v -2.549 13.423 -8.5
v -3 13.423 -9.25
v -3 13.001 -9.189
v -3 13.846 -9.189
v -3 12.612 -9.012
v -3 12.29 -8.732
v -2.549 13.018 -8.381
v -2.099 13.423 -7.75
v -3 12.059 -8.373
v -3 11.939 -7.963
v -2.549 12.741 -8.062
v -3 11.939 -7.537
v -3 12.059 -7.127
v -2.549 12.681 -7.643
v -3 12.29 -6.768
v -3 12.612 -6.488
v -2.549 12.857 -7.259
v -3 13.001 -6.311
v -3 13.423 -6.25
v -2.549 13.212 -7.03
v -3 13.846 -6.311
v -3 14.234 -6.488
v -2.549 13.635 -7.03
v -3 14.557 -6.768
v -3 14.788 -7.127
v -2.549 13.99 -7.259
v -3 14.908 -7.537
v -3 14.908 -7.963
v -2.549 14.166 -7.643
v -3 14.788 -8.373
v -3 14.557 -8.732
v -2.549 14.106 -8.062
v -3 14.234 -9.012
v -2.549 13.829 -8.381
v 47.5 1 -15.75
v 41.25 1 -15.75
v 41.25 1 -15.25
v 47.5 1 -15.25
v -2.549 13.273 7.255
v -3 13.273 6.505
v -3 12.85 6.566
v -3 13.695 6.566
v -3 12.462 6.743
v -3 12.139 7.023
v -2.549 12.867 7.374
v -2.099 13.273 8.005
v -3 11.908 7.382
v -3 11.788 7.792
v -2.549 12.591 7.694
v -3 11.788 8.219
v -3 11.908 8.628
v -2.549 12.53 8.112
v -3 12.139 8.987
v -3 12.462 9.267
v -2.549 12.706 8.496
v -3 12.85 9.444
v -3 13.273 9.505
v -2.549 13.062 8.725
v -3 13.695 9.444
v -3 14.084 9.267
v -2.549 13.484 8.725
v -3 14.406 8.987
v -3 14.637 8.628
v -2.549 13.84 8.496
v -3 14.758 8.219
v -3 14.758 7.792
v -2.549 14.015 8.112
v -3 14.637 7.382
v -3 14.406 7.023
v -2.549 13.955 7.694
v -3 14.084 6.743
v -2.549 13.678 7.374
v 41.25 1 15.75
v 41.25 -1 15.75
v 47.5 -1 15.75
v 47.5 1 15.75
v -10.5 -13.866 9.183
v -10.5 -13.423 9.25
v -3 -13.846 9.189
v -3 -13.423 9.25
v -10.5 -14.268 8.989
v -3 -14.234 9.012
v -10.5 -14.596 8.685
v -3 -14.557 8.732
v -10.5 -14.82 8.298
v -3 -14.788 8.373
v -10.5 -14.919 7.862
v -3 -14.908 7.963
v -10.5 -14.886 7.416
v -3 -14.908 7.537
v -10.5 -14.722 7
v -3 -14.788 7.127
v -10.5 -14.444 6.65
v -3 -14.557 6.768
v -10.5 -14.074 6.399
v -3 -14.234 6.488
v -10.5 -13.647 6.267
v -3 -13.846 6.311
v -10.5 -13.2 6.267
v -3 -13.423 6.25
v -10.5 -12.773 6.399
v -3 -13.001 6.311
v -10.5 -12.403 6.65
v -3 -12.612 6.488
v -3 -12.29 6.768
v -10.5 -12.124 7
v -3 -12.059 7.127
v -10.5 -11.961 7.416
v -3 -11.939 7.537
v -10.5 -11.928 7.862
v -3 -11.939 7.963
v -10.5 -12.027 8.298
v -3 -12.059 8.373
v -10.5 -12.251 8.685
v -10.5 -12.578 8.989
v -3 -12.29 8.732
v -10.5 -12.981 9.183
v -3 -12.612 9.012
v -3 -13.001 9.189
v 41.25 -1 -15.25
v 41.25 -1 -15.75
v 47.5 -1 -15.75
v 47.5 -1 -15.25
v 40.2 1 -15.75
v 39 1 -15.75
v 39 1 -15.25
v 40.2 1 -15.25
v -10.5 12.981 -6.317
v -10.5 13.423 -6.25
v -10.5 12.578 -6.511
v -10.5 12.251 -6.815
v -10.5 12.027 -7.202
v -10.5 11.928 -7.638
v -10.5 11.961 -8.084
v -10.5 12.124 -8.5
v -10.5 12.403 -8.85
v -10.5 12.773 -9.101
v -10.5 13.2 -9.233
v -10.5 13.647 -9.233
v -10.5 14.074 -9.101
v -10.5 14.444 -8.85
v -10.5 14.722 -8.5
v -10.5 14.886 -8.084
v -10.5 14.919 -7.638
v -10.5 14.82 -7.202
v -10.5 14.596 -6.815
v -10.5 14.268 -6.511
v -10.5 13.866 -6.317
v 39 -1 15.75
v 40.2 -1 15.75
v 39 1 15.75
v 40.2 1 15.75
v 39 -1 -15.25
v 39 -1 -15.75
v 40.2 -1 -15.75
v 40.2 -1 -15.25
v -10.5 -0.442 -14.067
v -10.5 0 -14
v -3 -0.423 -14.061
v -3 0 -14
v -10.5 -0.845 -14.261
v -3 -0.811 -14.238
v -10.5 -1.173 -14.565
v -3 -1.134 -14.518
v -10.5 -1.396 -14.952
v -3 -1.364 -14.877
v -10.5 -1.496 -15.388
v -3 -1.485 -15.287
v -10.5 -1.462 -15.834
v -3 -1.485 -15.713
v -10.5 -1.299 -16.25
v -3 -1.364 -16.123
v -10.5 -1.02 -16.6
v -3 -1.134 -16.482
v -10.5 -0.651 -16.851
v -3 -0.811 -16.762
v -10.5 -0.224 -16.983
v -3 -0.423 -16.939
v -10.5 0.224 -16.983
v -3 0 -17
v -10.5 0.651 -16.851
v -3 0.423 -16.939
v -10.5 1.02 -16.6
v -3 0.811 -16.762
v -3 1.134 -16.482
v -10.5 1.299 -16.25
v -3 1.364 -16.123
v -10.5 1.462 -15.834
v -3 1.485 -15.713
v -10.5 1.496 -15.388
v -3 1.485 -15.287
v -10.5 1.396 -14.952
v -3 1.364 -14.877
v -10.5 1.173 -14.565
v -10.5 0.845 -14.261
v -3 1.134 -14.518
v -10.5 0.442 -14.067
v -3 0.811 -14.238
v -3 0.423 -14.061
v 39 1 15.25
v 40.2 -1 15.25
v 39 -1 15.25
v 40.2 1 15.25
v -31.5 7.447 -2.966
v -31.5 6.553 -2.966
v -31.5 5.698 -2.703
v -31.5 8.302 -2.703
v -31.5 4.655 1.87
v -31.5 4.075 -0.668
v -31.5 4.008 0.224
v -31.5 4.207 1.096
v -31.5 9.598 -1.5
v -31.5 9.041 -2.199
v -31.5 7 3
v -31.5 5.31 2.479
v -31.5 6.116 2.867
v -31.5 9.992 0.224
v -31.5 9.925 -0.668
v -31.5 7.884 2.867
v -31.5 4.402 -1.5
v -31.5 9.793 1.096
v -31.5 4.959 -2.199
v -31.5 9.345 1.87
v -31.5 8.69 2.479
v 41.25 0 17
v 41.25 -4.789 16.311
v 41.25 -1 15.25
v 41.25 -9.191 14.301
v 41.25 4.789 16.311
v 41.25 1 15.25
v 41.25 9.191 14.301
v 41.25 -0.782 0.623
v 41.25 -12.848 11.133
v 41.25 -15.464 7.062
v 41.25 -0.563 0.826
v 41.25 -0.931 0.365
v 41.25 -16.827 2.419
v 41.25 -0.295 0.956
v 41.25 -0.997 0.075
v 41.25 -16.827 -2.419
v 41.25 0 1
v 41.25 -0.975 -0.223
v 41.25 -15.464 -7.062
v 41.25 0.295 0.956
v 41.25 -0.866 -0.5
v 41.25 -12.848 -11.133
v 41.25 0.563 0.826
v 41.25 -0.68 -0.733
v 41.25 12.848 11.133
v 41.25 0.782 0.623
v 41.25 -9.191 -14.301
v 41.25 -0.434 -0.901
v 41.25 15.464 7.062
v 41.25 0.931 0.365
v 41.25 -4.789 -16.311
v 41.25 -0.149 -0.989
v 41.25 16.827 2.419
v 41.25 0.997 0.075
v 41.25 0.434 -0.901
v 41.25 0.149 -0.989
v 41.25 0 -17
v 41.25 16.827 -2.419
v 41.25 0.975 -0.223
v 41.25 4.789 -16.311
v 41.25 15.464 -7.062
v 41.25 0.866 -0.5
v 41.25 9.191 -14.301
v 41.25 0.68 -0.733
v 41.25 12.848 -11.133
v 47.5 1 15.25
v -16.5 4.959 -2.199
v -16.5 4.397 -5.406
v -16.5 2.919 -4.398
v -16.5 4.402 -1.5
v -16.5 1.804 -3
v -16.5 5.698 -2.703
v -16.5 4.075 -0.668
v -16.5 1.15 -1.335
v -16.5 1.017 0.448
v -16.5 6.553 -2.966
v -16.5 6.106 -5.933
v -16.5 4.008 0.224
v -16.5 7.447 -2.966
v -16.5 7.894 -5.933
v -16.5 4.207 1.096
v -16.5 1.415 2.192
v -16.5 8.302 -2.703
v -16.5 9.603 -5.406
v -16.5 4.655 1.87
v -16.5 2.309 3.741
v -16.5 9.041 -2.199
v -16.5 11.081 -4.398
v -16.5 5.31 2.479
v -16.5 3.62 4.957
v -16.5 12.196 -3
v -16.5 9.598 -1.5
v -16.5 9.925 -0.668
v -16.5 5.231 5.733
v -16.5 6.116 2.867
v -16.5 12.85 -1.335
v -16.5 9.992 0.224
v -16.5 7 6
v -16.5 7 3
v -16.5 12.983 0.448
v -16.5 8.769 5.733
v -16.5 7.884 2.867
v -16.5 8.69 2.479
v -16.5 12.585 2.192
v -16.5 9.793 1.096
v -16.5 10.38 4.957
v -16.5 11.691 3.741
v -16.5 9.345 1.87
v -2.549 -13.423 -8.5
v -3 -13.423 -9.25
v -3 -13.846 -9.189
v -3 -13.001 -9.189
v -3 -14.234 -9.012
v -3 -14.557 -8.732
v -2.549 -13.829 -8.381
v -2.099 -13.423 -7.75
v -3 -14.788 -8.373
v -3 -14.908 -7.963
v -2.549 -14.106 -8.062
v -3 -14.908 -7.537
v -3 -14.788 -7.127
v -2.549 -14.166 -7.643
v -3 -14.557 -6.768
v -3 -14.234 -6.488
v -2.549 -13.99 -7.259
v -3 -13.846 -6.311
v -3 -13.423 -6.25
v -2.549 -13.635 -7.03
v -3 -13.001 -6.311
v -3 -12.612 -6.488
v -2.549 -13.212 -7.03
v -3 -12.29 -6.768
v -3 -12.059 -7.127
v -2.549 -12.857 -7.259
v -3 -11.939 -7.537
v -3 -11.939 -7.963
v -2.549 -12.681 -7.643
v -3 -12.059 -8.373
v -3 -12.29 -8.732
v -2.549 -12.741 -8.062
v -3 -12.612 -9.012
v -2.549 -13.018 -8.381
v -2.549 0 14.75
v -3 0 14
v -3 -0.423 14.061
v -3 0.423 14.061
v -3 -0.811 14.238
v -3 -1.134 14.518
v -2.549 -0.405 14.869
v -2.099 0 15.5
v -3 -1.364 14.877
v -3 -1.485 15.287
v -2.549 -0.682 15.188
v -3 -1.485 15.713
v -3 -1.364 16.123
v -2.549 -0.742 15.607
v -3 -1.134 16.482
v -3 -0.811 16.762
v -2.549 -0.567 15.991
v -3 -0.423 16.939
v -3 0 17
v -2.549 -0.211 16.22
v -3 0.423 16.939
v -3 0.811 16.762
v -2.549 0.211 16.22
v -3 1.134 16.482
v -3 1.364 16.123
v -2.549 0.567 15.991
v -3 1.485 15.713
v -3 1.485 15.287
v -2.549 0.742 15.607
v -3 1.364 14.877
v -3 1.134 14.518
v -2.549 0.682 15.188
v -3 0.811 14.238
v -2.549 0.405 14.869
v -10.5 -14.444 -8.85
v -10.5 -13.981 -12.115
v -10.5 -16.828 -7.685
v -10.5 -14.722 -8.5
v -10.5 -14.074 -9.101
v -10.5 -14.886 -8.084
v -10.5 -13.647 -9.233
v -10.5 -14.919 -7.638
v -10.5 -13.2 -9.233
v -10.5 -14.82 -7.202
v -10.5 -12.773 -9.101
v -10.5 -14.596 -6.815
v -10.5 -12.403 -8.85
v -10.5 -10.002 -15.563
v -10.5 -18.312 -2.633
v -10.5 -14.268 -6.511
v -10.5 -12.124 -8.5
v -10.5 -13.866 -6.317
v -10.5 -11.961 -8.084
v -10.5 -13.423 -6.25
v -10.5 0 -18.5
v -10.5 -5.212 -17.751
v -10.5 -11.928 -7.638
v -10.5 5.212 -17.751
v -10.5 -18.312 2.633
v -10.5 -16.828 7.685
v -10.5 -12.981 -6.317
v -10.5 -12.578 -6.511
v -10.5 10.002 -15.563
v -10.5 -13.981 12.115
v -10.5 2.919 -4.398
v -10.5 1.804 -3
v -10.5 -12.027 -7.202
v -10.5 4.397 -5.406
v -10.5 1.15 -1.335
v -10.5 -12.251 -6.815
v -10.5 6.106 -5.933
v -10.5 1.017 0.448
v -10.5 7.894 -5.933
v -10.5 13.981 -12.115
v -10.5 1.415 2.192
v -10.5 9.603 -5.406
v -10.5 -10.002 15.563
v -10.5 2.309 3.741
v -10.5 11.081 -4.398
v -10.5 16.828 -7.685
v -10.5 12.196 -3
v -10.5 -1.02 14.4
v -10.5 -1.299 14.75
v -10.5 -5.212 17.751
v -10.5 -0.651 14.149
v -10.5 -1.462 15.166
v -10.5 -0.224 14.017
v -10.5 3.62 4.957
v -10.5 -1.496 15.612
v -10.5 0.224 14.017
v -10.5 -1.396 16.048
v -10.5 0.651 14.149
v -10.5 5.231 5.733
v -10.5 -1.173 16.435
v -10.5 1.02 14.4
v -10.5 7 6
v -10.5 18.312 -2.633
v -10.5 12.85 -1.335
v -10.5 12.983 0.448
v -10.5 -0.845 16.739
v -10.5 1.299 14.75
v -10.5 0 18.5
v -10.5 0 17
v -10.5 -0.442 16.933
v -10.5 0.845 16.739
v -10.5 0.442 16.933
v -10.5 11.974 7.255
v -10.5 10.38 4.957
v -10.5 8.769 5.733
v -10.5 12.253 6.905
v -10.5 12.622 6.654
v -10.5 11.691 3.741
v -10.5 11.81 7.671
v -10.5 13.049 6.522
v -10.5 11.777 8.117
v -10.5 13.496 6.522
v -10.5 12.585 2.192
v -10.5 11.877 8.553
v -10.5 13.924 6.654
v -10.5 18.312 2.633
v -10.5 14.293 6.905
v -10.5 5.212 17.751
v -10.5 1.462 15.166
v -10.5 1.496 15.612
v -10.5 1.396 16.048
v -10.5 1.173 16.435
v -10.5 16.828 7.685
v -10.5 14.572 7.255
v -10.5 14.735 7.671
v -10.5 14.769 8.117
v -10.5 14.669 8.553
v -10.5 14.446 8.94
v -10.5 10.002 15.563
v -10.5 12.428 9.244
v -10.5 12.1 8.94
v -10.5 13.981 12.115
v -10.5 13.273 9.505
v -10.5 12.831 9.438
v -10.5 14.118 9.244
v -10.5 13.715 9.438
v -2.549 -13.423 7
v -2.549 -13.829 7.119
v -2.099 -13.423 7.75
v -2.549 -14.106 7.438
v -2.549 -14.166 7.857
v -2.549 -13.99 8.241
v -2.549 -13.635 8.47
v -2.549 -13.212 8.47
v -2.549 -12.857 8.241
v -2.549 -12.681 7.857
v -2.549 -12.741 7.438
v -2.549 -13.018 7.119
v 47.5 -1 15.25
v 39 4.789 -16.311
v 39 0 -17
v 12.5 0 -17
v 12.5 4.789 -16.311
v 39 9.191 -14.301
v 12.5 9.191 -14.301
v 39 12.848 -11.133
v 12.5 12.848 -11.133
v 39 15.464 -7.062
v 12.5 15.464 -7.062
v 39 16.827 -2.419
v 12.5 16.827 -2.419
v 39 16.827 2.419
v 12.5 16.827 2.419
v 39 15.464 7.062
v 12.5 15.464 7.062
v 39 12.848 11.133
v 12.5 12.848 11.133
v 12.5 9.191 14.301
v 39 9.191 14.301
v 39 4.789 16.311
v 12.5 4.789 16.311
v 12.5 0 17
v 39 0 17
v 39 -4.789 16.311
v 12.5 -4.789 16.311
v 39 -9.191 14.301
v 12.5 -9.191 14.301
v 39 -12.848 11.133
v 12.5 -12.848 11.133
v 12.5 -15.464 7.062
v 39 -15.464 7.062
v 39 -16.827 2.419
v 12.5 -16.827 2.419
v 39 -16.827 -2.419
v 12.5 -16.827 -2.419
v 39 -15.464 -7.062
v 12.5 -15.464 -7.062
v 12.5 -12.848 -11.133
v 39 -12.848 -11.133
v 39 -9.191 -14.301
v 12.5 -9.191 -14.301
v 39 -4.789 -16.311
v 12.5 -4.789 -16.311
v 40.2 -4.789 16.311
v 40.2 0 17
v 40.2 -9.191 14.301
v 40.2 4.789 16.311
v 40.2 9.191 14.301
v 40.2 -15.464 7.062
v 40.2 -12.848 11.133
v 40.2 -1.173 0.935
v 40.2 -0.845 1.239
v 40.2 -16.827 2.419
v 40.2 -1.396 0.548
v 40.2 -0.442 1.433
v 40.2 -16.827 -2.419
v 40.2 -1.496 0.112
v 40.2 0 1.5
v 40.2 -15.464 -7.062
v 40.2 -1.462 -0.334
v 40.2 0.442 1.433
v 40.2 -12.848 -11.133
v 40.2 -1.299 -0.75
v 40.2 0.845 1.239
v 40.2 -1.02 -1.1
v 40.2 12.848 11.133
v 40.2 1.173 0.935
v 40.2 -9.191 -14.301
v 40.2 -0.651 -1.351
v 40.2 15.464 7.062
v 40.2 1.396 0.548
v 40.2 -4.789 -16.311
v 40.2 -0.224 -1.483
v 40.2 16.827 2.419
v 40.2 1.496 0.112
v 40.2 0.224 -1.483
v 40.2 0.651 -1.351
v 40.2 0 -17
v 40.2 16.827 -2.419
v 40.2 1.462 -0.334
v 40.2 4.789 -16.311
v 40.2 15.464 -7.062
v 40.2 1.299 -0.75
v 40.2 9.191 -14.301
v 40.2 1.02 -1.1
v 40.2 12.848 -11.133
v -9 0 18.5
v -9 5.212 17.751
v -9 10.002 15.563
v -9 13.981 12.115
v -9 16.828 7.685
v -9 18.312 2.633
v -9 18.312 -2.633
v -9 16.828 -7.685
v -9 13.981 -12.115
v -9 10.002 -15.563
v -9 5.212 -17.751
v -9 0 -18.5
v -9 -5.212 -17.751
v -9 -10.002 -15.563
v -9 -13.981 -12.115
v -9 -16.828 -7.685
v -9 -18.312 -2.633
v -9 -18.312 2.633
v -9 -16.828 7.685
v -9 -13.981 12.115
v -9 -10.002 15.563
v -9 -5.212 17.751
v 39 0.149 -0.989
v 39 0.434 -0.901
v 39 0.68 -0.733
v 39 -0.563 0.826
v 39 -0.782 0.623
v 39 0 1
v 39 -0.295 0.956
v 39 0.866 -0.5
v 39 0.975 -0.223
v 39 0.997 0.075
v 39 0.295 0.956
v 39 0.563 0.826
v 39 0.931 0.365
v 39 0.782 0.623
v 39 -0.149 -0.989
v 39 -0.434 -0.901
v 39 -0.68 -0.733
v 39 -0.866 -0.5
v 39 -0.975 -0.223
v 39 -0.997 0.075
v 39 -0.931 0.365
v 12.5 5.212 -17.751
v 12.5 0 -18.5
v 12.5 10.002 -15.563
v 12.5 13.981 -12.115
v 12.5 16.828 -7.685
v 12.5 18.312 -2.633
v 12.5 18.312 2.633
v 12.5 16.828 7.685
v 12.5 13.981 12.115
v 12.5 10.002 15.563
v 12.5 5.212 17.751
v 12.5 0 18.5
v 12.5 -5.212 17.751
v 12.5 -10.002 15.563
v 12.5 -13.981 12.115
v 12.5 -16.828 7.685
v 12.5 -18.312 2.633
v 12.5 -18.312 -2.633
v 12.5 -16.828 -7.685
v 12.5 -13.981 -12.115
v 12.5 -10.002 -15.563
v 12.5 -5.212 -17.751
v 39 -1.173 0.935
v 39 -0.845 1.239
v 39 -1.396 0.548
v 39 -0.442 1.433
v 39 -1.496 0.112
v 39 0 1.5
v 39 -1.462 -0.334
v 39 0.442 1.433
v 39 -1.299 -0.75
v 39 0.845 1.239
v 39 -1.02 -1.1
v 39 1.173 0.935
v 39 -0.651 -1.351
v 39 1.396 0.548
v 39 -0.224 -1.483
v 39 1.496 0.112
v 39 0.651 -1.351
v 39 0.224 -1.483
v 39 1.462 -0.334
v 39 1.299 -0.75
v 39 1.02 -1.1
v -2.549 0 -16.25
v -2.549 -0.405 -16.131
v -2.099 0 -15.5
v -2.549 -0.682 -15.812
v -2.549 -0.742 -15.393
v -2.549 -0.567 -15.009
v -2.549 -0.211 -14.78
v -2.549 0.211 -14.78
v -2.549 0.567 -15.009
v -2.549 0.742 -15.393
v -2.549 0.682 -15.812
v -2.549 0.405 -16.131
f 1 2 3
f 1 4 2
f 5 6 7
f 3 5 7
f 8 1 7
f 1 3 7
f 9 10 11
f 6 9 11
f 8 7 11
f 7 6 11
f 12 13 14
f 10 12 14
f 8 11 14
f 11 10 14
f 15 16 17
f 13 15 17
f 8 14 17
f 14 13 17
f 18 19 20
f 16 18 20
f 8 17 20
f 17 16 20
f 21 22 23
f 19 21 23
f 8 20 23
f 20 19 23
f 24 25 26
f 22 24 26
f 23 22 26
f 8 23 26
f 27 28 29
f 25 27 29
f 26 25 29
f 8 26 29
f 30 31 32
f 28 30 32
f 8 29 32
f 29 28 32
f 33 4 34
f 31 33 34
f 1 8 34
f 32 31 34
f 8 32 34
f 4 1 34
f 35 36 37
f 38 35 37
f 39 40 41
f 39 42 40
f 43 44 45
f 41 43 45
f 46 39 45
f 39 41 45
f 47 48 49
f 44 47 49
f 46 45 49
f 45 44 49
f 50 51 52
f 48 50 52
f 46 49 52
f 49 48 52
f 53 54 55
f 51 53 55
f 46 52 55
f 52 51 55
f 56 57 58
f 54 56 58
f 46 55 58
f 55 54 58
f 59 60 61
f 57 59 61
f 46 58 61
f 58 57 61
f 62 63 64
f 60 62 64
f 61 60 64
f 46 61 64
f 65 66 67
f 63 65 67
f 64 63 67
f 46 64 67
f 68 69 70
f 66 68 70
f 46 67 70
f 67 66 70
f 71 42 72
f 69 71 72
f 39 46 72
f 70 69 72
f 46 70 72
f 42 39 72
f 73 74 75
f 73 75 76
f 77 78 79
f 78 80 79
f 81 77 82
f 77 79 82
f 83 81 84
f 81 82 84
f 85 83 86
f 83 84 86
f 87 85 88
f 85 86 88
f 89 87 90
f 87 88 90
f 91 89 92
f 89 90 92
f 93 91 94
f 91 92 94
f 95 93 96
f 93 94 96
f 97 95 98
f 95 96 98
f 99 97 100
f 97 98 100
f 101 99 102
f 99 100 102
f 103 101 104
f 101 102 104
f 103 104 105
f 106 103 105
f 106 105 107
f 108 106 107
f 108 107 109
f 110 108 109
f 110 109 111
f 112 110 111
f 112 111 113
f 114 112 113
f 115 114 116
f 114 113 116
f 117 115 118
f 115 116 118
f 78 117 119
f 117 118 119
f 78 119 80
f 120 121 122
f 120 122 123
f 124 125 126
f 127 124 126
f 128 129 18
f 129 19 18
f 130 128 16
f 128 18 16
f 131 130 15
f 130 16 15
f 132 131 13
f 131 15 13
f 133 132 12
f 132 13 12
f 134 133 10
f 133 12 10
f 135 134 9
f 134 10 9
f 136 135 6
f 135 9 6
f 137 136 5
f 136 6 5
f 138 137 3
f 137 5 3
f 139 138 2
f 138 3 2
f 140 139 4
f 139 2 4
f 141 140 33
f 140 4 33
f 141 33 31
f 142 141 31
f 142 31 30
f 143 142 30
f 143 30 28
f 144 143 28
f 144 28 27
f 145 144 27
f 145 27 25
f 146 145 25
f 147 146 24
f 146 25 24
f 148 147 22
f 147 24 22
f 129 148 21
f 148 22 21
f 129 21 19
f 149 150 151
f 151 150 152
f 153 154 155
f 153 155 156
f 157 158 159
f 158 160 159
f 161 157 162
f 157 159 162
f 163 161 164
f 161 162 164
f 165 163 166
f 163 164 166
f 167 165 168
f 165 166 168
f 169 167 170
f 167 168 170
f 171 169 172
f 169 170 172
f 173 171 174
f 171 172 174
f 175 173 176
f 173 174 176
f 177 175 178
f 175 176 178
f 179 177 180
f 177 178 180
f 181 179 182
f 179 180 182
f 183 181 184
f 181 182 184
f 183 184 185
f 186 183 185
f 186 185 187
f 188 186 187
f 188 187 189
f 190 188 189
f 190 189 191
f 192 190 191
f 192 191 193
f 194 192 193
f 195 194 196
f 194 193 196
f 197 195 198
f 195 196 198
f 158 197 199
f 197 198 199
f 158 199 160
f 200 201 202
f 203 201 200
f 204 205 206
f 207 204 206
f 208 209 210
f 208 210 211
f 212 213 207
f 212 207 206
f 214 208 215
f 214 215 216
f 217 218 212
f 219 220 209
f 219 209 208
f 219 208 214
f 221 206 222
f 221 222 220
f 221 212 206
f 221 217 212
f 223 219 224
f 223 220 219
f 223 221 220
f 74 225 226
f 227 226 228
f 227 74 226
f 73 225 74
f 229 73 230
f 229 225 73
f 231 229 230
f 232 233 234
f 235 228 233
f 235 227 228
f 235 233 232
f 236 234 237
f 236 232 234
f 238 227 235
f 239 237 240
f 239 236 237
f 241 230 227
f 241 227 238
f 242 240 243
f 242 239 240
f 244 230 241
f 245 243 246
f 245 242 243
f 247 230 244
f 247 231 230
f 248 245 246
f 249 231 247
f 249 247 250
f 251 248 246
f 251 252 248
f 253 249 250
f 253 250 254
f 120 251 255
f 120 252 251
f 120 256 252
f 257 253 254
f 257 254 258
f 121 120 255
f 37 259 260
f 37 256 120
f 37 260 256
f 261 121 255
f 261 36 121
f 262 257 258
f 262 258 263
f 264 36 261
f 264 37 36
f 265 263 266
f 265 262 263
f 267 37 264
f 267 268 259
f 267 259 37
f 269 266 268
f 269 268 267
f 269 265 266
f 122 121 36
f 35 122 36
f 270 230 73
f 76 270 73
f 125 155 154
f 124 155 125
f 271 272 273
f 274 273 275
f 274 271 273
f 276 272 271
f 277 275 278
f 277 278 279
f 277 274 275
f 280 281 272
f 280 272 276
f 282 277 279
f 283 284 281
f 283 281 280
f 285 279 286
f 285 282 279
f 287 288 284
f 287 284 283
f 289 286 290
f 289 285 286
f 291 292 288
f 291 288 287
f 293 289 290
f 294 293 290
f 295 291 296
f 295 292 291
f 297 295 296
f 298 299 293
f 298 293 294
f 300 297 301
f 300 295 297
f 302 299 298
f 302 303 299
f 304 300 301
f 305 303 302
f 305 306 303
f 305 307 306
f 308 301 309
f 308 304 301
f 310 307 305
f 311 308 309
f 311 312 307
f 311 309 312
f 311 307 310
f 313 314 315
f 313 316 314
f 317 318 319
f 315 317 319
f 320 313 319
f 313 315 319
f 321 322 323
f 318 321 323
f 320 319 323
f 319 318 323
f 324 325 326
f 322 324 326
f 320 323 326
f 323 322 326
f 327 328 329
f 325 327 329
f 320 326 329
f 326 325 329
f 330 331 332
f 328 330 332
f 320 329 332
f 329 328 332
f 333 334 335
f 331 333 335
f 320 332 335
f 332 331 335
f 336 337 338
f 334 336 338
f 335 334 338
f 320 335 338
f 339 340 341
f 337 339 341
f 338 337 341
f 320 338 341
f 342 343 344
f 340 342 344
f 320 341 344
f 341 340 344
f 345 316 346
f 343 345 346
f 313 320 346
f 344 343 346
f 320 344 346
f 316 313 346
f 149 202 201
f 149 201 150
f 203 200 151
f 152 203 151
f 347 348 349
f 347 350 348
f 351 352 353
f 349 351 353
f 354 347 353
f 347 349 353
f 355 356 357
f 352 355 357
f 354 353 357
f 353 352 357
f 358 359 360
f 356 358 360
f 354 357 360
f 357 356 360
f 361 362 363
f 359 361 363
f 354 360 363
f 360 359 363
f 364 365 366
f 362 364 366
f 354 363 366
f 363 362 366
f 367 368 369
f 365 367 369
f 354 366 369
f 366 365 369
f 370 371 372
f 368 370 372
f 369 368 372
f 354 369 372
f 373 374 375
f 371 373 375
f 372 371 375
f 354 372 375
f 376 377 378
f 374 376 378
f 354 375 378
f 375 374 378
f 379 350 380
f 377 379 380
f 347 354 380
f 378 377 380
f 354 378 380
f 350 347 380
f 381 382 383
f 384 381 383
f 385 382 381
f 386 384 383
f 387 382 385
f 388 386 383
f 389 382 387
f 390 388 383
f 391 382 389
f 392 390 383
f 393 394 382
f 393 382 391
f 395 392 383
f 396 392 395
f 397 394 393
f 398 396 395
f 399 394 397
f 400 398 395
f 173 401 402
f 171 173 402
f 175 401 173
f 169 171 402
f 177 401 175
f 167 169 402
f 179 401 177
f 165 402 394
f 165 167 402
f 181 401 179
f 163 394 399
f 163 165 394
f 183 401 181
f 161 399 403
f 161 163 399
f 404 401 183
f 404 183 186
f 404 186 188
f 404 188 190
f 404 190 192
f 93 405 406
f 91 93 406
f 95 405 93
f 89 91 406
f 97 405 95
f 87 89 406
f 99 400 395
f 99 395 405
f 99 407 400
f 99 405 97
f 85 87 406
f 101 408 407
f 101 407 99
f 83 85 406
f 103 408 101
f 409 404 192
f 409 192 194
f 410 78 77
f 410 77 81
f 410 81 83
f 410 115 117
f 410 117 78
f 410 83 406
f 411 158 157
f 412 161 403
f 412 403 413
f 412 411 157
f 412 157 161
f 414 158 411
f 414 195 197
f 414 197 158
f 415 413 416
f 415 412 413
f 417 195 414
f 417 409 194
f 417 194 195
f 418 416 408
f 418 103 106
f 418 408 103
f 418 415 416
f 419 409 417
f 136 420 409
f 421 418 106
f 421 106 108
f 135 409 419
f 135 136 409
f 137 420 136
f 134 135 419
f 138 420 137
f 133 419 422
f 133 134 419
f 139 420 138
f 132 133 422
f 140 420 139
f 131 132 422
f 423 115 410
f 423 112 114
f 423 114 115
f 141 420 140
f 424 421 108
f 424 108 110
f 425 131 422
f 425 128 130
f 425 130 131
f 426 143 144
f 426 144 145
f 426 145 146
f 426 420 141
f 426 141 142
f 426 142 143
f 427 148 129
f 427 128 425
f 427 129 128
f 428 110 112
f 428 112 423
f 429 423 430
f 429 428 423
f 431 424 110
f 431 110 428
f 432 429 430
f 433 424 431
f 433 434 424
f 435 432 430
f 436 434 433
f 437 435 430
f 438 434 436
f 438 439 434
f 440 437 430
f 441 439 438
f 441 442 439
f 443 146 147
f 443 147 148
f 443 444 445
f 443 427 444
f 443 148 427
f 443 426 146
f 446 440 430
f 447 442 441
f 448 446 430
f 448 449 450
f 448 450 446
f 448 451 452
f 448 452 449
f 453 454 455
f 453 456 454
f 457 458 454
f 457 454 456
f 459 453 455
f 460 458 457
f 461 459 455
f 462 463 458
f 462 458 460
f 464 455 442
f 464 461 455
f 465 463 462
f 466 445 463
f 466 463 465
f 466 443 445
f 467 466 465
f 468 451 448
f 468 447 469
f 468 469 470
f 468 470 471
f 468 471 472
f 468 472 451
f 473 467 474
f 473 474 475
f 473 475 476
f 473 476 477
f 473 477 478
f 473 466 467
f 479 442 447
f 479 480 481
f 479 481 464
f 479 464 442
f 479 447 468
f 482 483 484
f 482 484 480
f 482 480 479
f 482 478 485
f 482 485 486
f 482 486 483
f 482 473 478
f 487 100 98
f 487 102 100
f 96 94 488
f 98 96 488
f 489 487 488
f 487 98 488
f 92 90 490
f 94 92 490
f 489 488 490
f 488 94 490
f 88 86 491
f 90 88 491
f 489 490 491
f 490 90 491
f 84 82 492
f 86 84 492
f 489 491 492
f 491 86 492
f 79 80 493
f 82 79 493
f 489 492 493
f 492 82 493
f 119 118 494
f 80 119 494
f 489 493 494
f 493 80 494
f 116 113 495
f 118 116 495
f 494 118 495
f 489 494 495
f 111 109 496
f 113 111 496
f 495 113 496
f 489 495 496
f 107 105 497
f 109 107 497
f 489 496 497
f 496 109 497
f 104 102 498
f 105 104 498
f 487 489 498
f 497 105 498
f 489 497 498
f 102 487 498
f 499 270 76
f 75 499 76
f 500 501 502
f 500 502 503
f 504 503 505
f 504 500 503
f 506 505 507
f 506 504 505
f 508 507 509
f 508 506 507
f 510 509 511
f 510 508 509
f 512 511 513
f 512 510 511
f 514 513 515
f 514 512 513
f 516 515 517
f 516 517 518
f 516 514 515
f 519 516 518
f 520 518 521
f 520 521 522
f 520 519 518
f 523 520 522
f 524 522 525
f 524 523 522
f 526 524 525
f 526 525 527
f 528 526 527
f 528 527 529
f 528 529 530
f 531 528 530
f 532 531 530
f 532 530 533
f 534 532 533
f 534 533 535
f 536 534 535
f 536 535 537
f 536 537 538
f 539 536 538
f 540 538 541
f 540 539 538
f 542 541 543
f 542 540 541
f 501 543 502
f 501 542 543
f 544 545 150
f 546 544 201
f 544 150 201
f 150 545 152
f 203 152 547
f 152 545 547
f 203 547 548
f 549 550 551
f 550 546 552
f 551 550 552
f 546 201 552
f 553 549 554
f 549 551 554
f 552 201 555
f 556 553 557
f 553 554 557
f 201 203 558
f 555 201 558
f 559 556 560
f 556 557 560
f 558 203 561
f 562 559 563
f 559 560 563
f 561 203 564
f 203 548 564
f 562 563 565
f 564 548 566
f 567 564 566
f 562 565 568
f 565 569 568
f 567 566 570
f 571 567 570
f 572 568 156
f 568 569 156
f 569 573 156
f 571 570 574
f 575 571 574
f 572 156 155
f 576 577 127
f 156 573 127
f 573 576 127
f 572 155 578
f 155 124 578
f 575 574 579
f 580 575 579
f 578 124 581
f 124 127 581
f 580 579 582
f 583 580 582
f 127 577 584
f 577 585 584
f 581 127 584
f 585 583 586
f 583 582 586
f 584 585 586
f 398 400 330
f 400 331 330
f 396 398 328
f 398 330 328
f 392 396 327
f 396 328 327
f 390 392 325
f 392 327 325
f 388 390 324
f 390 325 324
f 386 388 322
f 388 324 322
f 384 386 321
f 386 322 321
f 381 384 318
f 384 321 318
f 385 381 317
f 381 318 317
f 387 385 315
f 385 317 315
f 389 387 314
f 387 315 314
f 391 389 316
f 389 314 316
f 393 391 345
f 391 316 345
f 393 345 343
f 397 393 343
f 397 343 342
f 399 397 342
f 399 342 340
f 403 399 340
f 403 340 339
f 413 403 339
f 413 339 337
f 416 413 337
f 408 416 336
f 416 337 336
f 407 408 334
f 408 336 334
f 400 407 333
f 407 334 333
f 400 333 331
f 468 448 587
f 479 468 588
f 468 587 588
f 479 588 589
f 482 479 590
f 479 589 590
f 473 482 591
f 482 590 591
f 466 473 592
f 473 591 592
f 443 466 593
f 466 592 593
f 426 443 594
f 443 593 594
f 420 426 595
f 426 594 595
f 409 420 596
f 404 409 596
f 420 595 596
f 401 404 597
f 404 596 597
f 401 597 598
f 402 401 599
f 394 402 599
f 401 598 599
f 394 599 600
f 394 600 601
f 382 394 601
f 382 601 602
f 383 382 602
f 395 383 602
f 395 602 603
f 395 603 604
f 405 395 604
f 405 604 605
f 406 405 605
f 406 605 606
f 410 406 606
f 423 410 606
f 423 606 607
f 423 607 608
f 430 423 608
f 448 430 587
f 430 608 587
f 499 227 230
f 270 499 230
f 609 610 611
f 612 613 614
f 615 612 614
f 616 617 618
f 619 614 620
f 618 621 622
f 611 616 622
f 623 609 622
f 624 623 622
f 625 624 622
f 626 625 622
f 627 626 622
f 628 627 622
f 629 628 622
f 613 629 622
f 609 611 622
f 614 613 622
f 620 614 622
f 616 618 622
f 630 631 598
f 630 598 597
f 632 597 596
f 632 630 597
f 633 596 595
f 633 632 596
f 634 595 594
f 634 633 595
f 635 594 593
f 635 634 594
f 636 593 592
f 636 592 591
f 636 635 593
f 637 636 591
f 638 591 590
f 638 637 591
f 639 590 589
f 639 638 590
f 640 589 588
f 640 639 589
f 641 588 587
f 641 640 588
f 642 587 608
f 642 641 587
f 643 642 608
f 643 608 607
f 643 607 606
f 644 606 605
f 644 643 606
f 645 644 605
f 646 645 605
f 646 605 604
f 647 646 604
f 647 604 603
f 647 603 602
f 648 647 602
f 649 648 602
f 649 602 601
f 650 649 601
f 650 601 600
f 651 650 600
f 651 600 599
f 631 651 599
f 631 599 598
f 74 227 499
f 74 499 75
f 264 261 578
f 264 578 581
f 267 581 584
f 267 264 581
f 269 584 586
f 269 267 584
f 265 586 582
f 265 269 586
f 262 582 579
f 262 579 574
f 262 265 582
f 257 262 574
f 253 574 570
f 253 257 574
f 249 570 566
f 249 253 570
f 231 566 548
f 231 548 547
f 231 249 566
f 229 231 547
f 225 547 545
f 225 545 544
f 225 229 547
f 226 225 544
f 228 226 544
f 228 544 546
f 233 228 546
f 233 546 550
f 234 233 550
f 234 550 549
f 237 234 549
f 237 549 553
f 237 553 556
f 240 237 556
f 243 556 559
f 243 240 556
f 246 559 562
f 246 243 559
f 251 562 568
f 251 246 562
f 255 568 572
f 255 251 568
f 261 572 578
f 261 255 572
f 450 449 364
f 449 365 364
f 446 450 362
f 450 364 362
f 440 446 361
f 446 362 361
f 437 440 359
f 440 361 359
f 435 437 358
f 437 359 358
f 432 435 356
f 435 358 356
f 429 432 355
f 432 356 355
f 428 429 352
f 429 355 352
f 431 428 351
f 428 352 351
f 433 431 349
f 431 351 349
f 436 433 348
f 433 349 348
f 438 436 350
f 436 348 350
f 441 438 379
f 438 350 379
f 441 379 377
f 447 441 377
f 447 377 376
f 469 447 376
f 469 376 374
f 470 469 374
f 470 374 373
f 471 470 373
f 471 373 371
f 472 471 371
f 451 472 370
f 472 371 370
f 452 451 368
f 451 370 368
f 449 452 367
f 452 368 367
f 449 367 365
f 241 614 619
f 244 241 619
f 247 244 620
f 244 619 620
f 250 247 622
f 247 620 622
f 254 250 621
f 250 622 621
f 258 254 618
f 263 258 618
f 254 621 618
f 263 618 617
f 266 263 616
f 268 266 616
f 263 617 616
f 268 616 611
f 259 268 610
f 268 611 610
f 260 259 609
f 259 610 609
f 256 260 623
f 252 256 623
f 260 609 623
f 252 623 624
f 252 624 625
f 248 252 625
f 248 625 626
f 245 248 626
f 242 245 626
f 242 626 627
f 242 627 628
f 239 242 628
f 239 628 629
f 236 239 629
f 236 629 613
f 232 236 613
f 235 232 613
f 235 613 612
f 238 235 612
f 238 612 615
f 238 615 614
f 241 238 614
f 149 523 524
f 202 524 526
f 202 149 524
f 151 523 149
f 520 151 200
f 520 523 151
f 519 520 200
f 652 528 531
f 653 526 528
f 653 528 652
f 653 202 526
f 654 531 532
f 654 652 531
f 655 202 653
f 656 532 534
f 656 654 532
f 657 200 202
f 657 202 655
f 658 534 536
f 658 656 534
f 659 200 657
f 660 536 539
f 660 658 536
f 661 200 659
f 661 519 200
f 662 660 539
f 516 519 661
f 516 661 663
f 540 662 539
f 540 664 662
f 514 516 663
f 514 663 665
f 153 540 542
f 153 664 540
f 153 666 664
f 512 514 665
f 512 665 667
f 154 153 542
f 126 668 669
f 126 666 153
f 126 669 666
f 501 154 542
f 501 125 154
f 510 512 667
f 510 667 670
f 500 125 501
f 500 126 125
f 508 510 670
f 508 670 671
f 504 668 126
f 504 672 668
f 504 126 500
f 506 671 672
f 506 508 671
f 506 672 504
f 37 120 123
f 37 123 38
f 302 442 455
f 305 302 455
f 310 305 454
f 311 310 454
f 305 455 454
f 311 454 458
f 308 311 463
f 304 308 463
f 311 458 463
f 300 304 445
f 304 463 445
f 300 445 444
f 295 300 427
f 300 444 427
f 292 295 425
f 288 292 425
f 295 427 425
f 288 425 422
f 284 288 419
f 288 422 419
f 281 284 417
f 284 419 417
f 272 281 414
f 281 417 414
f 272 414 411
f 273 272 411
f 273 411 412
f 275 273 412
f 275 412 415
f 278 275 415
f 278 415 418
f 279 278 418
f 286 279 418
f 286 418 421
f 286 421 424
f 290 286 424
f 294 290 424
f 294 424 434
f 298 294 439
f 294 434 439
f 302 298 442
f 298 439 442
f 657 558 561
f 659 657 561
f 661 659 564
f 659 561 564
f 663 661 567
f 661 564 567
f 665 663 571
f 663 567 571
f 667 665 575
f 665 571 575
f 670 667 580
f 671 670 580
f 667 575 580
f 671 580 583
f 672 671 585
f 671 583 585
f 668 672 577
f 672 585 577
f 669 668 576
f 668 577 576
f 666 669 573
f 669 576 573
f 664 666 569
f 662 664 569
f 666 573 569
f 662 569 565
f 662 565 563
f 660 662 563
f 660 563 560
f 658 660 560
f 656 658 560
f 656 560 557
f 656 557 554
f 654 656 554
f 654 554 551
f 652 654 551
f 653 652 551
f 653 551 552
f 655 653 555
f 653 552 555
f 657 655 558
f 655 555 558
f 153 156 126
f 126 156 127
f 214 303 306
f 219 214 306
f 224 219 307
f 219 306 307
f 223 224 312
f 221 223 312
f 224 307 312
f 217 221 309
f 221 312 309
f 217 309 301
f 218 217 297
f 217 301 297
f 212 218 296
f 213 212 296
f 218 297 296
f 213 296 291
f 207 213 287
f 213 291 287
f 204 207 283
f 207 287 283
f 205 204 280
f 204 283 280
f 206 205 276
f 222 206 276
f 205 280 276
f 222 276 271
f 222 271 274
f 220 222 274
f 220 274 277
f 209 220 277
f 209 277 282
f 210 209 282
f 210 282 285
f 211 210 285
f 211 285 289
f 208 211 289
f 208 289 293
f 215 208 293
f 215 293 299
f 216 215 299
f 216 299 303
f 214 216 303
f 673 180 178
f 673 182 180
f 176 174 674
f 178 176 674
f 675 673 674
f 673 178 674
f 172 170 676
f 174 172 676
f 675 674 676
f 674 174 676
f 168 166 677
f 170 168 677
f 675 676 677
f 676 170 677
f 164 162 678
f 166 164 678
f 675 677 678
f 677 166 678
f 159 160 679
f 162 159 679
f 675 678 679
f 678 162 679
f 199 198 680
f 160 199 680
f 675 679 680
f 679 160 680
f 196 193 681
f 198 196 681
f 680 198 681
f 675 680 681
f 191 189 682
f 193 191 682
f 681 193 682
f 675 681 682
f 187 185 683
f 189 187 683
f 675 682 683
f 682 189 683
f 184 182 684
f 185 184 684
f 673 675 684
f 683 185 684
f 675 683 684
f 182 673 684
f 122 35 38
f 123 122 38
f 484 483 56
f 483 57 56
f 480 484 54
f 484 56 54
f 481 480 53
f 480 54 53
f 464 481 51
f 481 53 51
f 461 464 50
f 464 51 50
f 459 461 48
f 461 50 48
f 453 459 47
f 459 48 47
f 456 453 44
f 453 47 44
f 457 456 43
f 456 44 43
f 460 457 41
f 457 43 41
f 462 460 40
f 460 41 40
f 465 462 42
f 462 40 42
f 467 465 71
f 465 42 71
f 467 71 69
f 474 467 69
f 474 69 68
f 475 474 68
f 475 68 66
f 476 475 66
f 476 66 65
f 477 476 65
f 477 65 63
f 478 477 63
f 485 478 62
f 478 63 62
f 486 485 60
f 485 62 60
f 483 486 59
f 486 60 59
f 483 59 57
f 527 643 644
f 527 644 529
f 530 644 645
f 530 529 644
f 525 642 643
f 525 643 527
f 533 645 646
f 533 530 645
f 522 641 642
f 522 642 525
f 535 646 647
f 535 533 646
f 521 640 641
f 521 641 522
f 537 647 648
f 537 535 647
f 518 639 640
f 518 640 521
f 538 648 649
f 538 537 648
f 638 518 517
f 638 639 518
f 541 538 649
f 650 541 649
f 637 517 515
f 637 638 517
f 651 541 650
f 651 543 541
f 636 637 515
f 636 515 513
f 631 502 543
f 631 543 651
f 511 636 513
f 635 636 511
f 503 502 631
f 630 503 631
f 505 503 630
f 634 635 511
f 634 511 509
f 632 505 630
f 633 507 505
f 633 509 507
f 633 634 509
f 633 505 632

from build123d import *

# Parameters (mm, degrees)
SKETCH1_R                      = 17
BOSS_EXTRUDE1_DEPTH            = 1.05
SKETCH2_W                      = 0.5
SKETCH2_H                      = 2
POLES_DEPTH                    = 1.2
POLES_DEPTH_BACK               = 7.3
SKETCH3_R                      = 1.5
BOSS_EXTRUDE3_DEPTH            = 1.2
SKETCH5_R                      = 17
BOSS_EXTRUDE5_DEPTH            = 26.5
SKETCH6_R                      = 18.5
REDUCTUR_DEPTH                 = 21.5
SKETCH35_R                     = 18.5
ENDPLATE_DEPTH                 = 1.5
SKETCH36_R                     = 6
BOSS_EXTRUDE25_DEPTH           = 6
F_3_1_3_1_DIAMETER_HOLE1_D     = 6
F_3_1_3_1_DIAMETER_HOLE1_DEPTH = 2.2
F_2_0_2_DIAMETER_HOLE1_D       = 2
F_2_0_2_DIAMETER_HOLE1_DEPTH   = 2.25
F_3_0MM_1_D                    = 3
F_3_0MM_1_DEPTH                = 7.5
F_3_0MM_1_TIP                  = 0.901290929
SKETCH_1_R                     = 3
EXTRUDE_1_DEPTH                = 21


with BuildPart() as part:
    # Sketch1 → Boss-Extrude1 (new body)
    with BuildSketch(Plane(origin=(41.25, 0, 0), x_dir=(0, 0, -1), z_dir=(1, 0, 0))):
        Circle(SKETCH1_R)
    extrude(amount=-BOSS_EXTRUDE1_DEPTH)

    # Sketch2 → Poles (add, two sides)
    with BuildSketch(Plane.ZY.offset(-40.2)) as poles_sk:
        with Locations((15.5, 0)):
            Rectangle(SKETCH2_W, SKETCH2_H)
        with Locations((-15.5, 0)):
            Rectangle(SKETCH2_W, SKETCH2_H)
    extrude(amount=POLES_DEPTH)
    extrude(poles_sk.sketch, amount=-POLES_DEPTH_BACK)

    # Sketch3 → Boss-Extrude3 (add)
    with BuildSketch(Plane.ZY.offset(-40.2)):
        Circle(SKETCH3_R)
    extrude(amount=BOSS_EXTRUDE3_DEPTH)

    # Sketch5 → Boss-Extrude5 (add)
    with BuildSketch(Plane(origin=(39, 0, 0), x_dir=(0, 0, -1), z_dir=(1, 0, 0))):
        Circle(SKETCH5_R)
    extrude(amount=-BOSS_EXTRUDE5_DEPTH)

    # Sketch6 → Reductur (add)
    with BuildSketch(Plane(origin=(12.5, 0, 0), x_dir=(0, 0, -1), z_dir=(1, 0, 0))):
        Circle(SKETCH6_R)
    extrude(amount=-REDUCTUR_DEPTH)

    # Sketch35 → Endplate (add)
    with BuildSketch(Plane.ZY.offset(9)):
        Circle(SKETCH35_R)
    extrude(amount=ENDPLATE_DEPTH)

    # Sketch36 → Boss-Extrude25 (add)
    with BuildSketch(Plane.ZY.offset(10.5)):
        with Locations((0, 7)):
            Circle(SKETCH36_R)
    extrude(amount=BOSS_EXTRUDE25_DEPTH)

    # Ø3.1 (3.1) Diameter Hole1
    with Locations(Plane.ZY.offset(16.5)):
        with Locations((0, 7)):
            Hole(F_3_1_3_1_DIAMETER_HOLE1_D / 2, depth=F_3_1_3_1_DIAMETER_HOLE1_DEPTH)

    # Ø2.0 (2) Diameter Hole1
    with Locations(Plane(origin=(41.25, 0, 0), x_dir=(0, 0, -1), z_dir=(1, 0, 0))):
        with Locations((0, 0)):
            Hole(F_2_0_2_DIAMETER_HOLE1_D / 2, depth=F_2_0_2_DIAMETER_HOLE1_DEPTH)

    # Ø3.0mm 定位孔1
    with Locations(Plane(origin=(-10.5, 0, -15.5), x_dir=(0, 0, -1), z_dir=(-1, 0, 0))):
        with Locations((0, 0), (-7.75, -13.423393759), (-23.50507477, -13.272858695), (-31, 0), (-23.25, 13.423393759), (-7.75, 13.423393759)):
            Hole(F_3_0MM_1_D / 2, depth=F_3_0MM_1_DEPTH)
            with Locations((0, 0, -(F_3_0MM_1_DEPTH + F_3_0MM_1_TIP / 2))):  # 118° drill point
                Cone(0, F_3_0MM_1_D / 2, F_3_0MM_1_TIP, mode=Mode.SUBTRACT)

    # 草圖1 → 填料-伸長1 (add)
    with BuildSketch(Plane.ZY.offset(10.5)):
        with Locations((0, 7)):
            Circle(SKETCH_1_R)
    extrude(amount=EXTRUDE_1_DEPTH)


solid = part.part
